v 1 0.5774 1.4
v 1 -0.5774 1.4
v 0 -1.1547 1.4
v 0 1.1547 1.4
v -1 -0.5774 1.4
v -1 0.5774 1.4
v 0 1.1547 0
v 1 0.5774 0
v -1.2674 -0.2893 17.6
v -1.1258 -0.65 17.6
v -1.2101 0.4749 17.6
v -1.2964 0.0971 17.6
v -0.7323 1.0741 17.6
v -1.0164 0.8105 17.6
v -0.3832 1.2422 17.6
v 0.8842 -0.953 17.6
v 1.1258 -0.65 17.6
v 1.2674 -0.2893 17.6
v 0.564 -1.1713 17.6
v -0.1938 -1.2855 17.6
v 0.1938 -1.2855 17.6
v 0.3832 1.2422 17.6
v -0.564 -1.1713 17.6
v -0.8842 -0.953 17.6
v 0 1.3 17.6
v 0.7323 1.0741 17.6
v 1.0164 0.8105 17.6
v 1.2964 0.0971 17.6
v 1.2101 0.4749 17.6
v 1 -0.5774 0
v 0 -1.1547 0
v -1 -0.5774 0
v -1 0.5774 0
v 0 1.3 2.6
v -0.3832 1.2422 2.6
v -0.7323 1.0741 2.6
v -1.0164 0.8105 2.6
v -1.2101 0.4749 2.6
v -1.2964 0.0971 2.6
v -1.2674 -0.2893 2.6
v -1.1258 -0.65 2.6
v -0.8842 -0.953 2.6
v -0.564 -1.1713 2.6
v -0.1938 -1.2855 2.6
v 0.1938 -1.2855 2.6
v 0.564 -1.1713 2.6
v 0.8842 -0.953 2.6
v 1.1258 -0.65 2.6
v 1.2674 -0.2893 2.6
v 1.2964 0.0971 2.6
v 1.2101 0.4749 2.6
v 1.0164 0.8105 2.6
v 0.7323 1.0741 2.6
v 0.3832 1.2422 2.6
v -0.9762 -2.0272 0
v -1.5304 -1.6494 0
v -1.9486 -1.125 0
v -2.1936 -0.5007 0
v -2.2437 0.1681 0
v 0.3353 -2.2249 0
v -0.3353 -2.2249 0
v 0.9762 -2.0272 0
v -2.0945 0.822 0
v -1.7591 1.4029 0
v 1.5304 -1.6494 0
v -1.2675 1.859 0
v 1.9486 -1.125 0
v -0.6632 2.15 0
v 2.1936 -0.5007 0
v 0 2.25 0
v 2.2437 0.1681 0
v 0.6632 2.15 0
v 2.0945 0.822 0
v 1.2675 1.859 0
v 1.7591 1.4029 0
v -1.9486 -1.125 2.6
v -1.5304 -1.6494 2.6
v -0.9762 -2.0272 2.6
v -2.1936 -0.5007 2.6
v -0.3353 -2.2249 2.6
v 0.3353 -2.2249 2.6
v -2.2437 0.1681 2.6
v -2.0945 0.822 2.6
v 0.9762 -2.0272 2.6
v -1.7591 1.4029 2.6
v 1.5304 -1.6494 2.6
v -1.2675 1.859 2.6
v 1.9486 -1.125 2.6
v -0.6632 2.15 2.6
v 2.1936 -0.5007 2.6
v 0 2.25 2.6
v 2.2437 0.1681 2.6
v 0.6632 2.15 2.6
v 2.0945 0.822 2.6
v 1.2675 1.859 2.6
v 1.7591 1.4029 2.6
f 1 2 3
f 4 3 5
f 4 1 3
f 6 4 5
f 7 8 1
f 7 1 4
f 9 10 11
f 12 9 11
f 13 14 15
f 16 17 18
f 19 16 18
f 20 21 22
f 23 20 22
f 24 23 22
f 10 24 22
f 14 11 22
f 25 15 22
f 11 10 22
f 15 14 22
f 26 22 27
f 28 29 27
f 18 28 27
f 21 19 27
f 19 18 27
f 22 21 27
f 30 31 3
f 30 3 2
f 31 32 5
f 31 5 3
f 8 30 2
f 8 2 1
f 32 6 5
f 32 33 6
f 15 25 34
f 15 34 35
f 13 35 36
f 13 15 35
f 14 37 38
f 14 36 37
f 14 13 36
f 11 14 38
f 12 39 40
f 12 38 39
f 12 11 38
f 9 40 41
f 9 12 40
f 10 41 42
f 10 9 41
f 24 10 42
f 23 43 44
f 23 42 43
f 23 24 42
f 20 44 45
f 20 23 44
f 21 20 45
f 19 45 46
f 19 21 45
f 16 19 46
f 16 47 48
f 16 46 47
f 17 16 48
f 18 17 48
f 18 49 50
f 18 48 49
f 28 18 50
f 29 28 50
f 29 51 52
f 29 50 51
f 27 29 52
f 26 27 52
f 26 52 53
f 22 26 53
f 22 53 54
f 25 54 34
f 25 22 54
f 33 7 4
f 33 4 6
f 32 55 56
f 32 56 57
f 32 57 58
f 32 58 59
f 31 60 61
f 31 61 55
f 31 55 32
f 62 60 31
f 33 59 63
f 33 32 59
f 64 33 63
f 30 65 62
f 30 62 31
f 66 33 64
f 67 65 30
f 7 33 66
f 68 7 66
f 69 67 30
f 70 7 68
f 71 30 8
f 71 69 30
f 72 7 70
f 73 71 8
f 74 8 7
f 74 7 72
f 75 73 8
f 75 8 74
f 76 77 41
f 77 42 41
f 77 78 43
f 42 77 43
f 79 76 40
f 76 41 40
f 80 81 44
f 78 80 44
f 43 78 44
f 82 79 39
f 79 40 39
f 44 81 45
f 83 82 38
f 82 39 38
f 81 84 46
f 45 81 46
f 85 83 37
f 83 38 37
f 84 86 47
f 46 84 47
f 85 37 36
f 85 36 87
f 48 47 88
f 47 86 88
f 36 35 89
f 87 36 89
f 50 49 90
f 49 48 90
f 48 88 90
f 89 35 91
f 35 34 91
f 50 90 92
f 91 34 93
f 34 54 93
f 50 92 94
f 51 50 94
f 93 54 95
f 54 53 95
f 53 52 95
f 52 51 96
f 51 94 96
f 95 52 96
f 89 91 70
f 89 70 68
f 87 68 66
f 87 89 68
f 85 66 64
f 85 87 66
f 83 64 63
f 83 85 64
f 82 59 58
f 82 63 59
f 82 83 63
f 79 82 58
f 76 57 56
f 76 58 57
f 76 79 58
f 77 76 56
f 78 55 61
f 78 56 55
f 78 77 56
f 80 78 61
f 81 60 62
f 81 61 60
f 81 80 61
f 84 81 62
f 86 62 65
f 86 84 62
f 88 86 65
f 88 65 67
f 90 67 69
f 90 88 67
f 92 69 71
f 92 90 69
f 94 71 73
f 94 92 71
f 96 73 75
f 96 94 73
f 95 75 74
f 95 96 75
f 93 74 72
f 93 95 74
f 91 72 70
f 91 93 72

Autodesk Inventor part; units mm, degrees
ref_plane "YZ Plane" through (0, 0, 0) normal (1, 0, 0) x (0, 1, 0)
ref_plane "XZ Plane" through (0, 0, 0) normal (0, 1, 0) x (-1, 0, 0)
ref_plane "XY Plane" through (0, 0, 0) normal (0, 0, 1) x (1, 0, 0)
sketch "スケッチ1" plane through (0, 0, 0) normal (1, 0, 0) x (0, 1, 0)
  line L0 (0, 17.6) -> (0, 0)
  line L1 (0, 0) -> (2.25, 0)
  line L2 (2.25, 0) -> (2.25, 2.6)
  line L3 (2.25, 2.6) -> (1.3, 2.6)
  line L4 (1.3, 2.6) -> (1.3, 17.6)
  line L5 (1.3, 17.6) -> (0, 17.6)
  dimension "d2" = 2.6
  dimension "d10" = 15
  dimension "d11" = 2.6
  dimension "d12" = 4.5
revolve "回転1" add sketch "スケッチ1" angle 360 about axis through (0, 0, 17.6) along (0, 0, -1)
thread "ねじ1" size "M2.6x0.45" class "6g" standard "ANSI Metric M Profile" full length
sketch "スケッチ2" plane through (0, 0, 0) normal (0, 0, -1) x (-1, 0, 0)
  line L0 (0, 1.1547) -> (1, 0.5774)
  line L1 (1, 0.5774) -> (1, -0.5774)
  line L2 (1, -0.5774) -> (0, -1.1547)
  line L3 (0, -1.1547) -> (-1, -0.5774)
  line L4 (-1, -0.5774) -> (-1, 0.5774)
  line L5 (-1, 0.5774) -> (0, 1.1547)
  line L6 (0, 2.25) -> (0, -2.25) construction
  circle A0 centre (0, 0) radius 2.25 projected
  dimension "d7" = 2
extrude "押し出し1" cut sketch "スケッチ2" against normal blind 1.4 contours L0 L1 L2 L3 L4 L5
properties part number "FC-2615EB" material "チタン"
